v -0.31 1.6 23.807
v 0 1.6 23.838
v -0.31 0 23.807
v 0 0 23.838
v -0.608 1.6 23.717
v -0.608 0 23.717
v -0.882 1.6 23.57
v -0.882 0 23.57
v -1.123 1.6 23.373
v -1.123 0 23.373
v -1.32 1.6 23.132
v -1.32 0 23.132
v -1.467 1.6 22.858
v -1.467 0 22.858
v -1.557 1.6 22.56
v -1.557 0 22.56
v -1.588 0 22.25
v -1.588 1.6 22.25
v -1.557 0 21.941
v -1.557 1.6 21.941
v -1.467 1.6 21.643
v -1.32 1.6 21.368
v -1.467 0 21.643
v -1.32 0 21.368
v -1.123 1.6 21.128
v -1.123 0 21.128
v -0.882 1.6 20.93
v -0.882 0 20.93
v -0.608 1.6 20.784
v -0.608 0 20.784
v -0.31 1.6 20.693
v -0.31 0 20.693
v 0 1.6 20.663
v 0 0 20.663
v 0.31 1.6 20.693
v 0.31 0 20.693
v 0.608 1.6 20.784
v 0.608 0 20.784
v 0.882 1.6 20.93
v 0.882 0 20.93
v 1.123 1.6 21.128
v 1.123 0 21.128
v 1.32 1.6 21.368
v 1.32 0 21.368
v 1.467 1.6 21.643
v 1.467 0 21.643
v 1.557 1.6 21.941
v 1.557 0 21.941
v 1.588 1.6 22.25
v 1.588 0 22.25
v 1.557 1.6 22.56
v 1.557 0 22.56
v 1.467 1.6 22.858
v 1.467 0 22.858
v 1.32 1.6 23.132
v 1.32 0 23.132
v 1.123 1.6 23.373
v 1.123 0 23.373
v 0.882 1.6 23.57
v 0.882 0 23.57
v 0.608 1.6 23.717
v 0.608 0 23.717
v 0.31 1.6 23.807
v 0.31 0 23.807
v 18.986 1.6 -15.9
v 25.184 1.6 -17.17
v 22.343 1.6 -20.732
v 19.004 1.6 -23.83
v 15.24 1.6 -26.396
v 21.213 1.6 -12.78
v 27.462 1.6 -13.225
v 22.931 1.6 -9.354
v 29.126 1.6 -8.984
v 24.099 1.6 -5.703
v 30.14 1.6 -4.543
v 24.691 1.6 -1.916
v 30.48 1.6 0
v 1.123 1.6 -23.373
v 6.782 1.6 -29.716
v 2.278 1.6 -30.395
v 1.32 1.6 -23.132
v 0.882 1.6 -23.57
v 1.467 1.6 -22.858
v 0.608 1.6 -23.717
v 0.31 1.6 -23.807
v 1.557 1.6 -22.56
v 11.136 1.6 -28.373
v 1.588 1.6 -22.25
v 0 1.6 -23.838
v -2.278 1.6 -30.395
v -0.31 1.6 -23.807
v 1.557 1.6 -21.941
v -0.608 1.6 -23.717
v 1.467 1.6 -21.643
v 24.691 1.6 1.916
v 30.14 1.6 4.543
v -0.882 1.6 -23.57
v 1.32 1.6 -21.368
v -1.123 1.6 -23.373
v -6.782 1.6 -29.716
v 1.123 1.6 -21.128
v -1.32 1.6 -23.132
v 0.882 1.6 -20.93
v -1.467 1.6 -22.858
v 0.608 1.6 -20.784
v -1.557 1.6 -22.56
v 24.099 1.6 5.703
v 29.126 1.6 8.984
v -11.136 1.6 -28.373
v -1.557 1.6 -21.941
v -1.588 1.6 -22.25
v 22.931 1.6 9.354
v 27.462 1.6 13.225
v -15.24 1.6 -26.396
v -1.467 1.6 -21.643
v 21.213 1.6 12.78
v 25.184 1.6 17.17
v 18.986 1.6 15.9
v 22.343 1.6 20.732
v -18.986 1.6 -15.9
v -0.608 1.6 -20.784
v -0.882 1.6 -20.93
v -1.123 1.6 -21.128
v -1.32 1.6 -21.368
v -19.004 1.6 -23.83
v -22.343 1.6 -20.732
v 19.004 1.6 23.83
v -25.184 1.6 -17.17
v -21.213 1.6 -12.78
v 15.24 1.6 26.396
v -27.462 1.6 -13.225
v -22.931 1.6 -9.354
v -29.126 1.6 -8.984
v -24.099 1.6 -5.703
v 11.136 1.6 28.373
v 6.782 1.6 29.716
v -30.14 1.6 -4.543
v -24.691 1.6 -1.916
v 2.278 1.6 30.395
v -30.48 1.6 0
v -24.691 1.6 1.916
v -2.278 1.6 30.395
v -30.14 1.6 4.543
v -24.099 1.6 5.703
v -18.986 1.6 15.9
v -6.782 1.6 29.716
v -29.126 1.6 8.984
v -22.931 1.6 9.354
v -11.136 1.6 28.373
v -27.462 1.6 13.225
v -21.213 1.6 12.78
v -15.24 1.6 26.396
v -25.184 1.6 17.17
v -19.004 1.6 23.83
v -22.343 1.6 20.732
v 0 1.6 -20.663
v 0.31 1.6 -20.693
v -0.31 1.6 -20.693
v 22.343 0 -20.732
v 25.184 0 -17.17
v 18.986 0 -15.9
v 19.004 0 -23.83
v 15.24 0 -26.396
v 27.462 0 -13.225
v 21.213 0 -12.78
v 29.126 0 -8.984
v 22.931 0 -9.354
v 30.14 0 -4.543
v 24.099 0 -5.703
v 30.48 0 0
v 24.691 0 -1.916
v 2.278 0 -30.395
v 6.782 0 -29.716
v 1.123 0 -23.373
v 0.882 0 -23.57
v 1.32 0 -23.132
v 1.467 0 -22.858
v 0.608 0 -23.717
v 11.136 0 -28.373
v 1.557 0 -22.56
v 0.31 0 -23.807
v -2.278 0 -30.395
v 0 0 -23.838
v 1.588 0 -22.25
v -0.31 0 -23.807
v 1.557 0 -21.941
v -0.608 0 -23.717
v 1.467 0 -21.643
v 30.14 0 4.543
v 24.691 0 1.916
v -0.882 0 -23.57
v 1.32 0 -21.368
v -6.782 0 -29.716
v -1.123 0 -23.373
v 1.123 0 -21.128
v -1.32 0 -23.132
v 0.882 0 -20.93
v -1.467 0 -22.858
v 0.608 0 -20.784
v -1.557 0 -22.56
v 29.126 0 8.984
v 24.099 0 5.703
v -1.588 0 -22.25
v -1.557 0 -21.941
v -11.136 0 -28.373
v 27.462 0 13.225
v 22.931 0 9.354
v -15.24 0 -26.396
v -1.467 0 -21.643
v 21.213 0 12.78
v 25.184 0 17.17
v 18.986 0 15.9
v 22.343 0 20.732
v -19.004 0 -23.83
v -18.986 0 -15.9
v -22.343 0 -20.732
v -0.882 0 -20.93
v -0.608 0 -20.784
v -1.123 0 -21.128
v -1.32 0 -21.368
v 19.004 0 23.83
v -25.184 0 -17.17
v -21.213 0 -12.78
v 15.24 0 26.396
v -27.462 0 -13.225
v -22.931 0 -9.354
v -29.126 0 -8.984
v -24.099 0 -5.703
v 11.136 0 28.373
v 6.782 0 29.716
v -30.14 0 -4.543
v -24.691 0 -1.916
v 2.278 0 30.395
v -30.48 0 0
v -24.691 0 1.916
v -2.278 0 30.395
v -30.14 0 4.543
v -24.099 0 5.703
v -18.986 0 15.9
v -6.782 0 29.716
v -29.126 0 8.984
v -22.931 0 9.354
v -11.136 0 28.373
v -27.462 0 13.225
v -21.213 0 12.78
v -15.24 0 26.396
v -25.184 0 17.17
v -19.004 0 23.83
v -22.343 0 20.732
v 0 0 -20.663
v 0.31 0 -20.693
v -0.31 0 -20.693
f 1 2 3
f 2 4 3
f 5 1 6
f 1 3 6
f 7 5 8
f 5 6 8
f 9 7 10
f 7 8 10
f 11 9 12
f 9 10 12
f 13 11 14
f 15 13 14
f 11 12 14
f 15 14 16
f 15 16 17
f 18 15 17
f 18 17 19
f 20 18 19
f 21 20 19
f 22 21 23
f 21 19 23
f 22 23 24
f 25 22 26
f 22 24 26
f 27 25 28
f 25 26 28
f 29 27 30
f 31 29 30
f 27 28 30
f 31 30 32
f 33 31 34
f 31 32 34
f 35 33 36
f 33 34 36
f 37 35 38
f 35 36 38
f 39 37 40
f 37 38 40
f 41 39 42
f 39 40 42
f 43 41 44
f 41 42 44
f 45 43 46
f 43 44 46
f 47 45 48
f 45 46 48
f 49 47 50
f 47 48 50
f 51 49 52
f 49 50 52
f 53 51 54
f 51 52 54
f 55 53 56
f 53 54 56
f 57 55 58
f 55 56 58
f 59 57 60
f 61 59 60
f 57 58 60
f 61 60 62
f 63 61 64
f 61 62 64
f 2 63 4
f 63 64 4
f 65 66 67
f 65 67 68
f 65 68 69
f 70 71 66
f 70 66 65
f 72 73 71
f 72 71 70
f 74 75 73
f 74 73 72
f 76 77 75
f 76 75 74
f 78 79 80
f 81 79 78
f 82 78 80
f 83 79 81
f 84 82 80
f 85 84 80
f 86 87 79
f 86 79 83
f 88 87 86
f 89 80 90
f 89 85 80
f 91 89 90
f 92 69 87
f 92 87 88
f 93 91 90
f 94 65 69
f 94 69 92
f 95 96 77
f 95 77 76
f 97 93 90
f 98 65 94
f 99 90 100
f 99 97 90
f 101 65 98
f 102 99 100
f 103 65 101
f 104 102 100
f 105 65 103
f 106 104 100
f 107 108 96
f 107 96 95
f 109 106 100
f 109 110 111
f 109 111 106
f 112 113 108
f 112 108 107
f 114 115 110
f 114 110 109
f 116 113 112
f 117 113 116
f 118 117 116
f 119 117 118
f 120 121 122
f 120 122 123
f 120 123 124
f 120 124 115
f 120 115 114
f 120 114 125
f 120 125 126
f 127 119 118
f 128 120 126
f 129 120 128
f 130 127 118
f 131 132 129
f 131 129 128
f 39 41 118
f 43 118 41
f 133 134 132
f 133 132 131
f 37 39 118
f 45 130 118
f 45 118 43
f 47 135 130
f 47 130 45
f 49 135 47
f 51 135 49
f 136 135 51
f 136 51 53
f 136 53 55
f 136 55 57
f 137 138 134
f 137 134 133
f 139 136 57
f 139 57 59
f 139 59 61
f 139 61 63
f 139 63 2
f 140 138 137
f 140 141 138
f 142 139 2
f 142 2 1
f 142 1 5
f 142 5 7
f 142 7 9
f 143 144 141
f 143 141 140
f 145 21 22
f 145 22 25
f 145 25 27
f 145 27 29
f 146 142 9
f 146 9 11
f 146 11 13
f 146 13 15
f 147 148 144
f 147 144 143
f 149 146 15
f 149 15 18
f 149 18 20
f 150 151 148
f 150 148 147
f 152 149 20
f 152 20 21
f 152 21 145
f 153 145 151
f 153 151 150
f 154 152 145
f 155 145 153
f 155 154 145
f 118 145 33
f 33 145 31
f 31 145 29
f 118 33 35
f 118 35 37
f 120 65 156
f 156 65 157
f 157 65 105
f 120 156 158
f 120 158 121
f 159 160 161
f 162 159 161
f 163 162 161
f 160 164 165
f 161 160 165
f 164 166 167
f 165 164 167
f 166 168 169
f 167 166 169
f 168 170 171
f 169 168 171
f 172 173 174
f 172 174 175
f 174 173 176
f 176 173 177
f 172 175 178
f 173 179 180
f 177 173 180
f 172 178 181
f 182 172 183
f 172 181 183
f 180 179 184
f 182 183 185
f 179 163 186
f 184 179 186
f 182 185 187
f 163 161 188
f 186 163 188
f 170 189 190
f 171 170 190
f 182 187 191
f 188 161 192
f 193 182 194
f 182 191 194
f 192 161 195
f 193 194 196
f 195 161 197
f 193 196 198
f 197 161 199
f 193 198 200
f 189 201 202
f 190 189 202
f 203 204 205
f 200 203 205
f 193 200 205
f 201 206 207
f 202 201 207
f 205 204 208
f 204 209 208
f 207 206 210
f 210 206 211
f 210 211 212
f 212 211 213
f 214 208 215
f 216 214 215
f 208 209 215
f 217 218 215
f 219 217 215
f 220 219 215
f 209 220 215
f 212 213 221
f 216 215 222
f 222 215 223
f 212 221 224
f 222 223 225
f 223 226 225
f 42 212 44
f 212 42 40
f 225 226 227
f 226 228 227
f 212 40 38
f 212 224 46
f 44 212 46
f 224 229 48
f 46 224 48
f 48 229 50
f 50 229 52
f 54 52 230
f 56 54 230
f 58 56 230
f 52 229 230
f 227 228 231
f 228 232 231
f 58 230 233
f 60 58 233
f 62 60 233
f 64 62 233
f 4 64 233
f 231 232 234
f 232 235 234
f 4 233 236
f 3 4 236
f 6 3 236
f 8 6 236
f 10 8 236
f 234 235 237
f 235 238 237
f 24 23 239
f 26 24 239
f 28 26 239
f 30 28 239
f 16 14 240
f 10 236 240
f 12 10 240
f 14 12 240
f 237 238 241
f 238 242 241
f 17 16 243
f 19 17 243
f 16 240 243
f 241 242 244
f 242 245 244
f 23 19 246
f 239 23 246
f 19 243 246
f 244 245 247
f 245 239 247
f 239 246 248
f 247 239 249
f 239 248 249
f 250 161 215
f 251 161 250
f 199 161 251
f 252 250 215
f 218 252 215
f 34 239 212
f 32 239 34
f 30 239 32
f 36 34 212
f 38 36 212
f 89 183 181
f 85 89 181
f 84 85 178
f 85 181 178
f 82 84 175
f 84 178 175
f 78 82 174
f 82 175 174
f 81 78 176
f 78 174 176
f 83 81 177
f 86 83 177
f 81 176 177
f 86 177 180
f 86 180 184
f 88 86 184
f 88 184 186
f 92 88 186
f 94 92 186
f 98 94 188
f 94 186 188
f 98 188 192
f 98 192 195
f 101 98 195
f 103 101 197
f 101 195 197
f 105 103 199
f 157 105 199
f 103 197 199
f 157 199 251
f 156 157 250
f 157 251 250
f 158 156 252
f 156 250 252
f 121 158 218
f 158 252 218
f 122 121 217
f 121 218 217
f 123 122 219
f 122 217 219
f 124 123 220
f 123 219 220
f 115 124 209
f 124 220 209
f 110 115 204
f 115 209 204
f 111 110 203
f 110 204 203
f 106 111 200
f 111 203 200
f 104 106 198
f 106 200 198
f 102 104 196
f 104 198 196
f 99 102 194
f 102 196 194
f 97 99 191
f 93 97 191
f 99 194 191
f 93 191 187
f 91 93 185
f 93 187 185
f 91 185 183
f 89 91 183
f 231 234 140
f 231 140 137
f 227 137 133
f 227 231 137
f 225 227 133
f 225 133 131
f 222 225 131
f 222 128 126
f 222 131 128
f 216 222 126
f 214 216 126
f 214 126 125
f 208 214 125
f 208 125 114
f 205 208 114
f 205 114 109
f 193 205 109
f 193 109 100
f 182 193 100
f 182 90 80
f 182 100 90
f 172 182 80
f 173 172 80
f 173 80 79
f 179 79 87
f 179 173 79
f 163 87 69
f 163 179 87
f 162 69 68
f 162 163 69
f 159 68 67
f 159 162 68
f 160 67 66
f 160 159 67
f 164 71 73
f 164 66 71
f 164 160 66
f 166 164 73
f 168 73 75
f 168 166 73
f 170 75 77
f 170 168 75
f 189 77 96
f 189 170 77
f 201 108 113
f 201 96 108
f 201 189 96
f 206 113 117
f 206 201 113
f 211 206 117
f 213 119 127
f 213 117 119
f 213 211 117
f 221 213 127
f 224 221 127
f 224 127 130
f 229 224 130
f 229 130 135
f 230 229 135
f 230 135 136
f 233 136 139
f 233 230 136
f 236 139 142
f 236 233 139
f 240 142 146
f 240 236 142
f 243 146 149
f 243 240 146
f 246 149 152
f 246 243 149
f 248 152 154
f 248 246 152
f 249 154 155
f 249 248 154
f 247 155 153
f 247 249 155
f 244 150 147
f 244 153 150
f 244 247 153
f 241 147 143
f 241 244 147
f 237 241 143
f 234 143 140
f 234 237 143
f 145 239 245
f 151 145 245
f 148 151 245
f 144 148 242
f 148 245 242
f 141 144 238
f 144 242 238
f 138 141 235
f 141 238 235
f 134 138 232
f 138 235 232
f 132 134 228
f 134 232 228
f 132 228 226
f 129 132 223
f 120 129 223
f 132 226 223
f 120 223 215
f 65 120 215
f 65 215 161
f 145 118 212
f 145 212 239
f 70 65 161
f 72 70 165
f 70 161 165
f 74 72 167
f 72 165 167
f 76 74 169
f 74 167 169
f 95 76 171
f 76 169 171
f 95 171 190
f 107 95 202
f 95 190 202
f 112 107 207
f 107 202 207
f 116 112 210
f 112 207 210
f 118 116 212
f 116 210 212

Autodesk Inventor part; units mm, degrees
ref_plane "YZ Plane" through (0, 0, 0) normal (1, 0, 0) x (0, 1, 0)
ref_plane "XZ Plane" through (0, 0, 0) normal (0, 1, 0) x (-1, 0, 0)
ref_plane "XY Plane" through (0, 0, 0) normal (0, 0, 1) x (1, 0, 0)
sketch "Sketch1" plane through (0, 0, 0) normal (0, 1, 0) x (-1, 0, 0)
  circle A0 centre (0, 0) radius 24.765
  circle A1 centre (0, 0) radius 30.48
  dimension "d0" = 49.53
  dimension "d1" = 60.96
extrude "Extrusion1" add sketch "Sketch1" along normal blind 1.6002
sketch "Sketch2" plane through (0, 1.6002, 0) normal (0, 1, 0) x (1, 0, 0)
  line L0 (0, 0) -> (0, 15.9004)
  line L1 (0, 15.9004) -> (-18.9864, 15.9004)
  circle A0 centre (0, 0) radius 24.765 projected
  line L2 (0, 15.9004) -> (18.9864, 15.9004)
  dimension "d4" = 15.9004
extrude "Extrusion2" add sketch "Sketch2" against normal blind 1.6002 contours L1 A0 L2 picked at (-11.1522, 17.2995)
pattern_circular "Circular Pattern1" count 2 over 360 about axis through (0, 0, 0) along (0, 1, 0) of "Extrusion2"
sketch "Sketch3" plane through (0, 1.6002, 0) normal (0, 1, 0) x (1, 0, 0)
  circle A0 centre (0, 0) radius 30.48 projected
  line L0 (-18.9864, -15.9004) -> (18.9864, -15.9004) projected
  line L1 (0, 0) -> (0, -22.2504)
  dimension "d11" = 22.2504
hole "Hole1" at (0, 1.6002, 22.2504) direction (0, -1, 0) diameter 3.175 depth 25.4 tip angle 118
pattern_circular "Circular Pattern2" count 2 over 360 about axis through (0, 0, 0) along (0, 1, 0) of "Hole1"
properties part number "retainer"
